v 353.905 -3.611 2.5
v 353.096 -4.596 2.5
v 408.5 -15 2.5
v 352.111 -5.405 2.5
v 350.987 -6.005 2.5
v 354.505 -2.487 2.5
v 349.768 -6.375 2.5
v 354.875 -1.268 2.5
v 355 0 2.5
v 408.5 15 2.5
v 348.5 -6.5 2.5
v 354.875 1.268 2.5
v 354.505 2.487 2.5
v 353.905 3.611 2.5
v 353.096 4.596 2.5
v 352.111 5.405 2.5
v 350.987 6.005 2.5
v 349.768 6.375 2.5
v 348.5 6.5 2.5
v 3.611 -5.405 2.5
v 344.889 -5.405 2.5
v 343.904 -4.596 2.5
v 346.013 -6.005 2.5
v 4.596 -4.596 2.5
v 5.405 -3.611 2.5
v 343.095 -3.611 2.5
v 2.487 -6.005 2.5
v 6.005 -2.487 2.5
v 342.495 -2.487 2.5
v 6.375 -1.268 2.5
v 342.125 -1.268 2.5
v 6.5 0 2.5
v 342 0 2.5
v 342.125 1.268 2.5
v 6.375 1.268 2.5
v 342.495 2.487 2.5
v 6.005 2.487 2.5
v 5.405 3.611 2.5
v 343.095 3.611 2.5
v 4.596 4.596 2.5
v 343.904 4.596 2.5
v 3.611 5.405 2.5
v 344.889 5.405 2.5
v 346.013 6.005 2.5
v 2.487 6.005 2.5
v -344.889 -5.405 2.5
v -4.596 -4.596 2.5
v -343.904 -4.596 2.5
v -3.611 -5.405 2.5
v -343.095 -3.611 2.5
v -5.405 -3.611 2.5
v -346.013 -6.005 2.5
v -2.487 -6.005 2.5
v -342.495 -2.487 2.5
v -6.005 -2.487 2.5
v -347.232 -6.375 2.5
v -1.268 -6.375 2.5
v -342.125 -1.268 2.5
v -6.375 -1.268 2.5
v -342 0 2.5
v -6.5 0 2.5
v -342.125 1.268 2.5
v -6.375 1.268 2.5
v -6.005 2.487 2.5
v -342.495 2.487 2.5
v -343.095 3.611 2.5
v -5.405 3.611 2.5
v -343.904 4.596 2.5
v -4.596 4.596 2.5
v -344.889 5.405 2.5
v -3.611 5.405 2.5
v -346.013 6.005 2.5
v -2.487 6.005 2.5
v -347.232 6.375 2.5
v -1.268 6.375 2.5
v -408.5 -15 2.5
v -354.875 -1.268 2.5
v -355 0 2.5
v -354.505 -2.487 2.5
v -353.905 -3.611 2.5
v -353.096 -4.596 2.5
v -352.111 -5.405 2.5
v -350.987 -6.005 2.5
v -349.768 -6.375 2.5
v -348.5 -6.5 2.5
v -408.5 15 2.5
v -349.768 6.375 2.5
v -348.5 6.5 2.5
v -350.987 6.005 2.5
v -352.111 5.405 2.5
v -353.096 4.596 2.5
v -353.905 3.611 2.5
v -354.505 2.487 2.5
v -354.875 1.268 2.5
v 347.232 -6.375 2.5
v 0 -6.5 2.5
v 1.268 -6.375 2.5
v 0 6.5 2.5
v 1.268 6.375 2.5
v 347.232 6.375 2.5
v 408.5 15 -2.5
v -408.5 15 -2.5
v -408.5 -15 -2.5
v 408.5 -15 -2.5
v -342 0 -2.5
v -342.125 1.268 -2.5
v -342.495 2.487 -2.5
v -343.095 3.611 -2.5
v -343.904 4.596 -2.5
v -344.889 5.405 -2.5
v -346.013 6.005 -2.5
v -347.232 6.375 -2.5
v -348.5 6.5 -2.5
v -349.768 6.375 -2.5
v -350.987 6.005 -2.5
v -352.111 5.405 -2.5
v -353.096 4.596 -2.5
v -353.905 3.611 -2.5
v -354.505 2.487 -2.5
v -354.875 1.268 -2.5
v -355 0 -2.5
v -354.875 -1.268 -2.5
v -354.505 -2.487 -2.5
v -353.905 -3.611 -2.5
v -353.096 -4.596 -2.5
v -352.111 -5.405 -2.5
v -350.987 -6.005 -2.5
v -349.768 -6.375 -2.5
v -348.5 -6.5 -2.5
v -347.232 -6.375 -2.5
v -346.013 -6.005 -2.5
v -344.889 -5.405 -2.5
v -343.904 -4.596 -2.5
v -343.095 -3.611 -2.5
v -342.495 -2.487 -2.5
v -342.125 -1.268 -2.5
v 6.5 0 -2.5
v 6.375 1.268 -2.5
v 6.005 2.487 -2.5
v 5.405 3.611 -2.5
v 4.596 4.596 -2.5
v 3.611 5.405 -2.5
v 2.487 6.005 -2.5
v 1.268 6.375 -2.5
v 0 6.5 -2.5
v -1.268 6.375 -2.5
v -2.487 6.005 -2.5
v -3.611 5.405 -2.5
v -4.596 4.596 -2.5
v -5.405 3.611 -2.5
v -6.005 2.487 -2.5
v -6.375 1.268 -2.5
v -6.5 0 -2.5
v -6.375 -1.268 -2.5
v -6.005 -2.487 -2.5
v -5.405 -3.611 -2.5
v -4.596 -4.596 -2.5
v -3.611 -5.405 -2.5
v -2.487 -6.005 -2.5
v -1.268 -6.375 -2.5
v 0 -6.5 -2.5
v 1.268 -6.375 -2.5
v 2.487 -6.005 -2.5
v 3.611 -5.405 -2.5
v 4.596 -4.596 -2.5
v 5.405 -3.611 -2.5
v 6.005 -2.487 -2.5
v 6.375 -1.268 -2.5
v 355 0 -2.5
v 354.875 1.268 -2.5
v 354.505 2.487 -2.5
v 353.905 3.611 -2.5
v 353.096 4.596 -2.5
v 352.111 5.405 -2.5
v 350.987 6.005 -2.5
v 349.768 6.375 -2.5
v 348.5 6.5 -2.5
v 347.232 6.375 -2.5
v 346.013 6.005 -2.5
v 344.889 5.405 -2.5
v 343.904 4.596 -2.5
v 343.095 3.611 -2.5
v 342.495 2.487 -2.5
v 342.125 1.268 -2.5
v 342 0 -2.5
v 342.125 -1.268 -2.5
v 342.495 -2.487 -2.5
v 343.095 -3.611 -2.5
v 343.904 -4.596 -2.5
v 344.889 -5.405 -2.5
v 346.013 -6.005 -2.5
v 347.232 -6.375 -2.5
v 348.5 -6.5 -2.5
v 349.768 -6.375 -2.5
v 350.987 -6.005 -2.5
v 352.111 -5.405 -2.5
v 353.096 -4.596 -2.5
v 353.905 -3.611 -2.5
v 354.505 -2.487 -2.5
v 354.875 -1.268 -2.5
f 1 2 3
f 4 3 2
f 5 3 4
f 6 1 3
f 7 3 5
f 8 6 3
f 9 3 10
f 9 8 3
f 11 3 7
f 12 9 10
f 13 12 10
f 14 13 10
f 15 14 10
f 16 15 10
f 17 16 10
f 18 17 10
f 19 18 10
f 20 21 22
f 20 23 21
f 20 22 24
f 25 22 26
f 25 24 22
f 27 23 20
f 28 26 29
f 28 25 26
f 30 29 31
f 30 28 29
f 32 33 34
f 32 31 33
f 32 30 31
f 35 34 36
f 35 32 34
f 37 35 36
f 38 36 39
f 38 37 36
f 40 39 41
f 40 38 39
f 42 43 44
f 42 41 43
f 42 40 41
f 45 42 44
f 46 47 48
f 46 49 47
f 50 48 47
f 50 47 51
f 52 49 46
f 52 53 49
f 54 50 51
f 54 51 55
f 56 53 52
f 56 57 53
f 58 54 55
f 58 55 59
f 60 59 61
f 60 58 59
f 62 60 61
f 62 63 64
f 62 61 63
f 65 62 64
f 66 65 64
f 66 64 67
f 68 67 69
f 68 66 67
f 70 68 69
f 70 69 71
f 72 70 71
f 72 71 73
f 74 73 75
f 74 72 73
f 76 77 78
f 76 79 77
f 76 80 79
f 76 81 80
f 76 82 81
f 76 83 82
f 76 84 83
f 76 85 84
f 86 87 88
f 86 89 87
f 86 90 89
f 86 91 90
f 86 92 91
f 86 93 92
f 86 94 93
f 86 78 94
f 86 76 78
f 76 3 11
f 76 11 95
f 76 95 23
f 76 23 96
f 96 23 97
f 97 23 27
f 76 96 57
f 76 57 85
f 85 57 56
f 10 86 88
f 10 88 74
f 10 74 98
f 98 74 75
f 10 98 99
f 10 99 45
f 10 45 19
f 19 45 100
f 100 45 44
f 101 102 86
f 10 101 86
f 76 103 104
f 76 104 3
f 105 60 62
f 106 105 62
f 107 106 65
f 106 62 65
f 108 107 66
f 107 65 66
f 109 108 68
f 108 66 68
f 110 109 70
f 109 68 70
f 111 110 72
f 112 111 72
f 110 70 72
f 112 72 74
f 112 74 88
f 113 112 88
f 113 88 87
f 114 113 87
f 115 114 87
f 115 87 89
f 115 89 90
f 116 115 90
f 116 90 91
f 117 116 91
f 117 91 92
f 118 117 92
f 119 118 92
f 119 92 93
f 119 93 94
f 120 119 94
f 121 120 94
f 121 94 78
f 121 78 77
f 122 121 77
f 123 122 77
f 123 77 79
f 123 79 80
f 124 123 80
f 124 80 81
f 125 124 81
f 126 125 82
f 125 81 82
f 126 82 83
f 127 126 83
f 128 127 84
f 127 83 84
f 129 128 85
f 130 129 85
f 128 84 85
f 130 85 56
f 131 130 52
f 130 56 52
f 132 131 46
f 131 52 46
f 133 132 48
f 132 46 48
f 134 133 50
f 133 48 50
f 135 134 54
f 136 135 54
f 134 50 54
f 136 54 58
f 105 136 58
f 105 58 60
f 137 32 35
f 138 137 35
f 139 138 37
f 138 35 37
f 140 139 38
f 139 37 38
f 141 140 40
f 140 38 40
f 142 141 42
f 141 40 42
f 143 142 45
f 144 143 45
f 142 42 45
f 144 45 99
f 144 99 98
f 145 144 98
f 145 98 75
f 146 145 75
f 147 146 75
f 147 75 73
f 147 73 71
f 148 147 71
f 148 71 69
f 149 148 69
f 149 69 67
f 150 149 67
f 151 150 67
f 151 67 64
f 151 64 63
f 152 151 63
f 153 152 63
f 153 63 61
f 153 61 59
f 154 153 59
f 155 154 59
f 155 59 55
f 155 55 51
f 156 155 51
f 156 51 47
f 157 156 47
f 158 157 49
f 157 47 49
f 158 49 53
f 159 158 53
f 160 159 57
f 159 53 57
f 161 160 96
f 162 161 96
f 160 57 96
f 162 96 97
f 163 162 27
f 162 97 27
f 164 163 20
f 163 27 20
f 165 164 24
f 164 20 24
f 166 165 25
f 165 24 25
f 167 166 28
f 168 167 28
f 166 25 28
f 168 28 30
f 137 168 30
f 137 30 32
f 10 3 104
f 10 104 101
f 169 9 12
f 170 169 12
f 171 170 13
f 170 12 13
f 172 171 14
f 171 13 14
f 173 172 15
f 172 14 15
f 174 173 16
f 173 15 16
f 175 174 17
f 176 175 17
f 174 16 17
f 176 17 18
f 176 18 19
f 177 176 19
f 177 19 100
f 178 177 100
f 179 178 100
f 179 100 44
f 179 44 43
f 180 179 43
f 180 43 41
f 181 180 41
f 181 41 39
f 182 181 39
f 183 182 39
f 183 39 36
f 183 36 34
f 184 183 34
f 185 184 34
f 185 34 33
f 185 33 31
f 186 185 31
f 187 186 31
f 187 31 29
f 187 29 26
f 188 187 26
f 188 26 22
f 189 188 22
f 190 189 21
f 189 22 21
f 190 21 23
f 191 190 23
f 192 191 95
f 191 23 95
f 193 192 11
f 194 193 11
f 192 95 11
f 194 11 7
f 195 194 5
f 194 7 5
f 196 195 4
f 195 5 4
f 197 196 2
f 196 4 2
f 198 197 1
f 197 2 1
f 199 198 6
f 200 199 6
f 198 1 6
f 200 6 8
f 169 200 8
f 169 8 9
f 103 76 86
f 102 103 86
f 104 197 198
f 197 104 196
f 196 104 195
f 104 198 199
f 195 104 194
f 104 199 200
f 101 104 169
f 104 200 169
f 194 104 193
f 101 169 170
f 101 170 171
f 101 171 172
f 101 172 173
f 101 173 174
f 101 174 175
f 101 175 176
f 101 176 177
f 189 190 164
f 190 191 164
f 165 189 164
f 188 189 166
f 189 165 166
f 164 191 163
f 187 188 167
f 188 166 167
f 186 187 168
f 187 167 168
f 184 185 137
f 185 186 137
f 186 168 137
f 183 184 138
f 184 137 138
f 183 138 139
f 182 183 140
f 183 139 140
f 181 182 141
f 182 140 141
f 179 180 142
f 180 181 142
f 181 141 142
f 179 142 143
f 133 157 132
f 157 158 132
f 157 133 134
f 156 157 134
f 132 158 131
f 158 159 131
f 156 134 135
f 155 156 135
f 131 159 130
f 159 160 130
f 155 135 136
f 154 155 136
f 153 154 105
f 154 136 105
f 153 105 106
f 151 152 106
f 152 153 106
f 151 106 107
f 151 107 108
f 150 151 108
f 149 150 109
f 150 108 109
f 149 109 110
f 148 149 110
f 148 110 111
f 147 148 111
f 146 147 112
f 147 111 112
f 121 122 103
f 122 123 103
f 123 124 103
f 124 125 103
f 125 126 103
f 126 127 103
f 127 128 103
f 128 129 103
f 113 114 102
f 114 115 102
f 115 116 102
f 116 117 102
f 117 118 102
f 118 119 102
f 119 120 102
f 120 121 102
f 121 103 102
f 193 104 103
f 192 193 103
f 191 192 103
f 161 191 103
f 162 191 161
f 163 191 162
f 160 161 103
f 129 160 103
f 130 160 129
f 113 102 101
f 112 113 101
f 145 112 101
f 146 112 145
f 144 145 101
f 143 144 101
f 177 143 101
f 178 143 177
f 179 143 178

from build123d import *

# Parameters (mm, degrees)
PLAT_W                          = 30
PLAT_H                          = 5
EL_MENT_M_CANO_SOUD_1_DEPTH     = 817
DIAM_TRE_DU_PER_AGE_13_0_13_1_D = 13
R_P_TITION_LIN_AIRE2_COUNT      = 3
R_P_TITION_LIN_AIRE2_PITCH      = 348.5


with BuildPart() as part:
    # plat → Elément mécano-soudé1 (new body)
    with BuildSketch(Plane.YZ.offset(-408.5)):
        Rectangle(PLAT_W, PLAT_H)
    extrude(amount=EL_MENT_M_CANO_SOUD_1_DEPTH)

    # Diamètre du perçage Ø13.0 (13)1 (through all)
    with Locations(Plane(origin=(0, 0, -2.5), x_dir=(-1, 0, 0), z_dir=(0, 0, -1))):
        with Locations((348.5, 0)):
            diam_tre_du_per_age_13_0_13_1 = Hole(DIAM_TRE_DU_PER_AGE_13_0_13_1_D / 2)

    # Répétition linéaire2: Diamètre du perçage Ø13.0 (13)1 ×3
    with Locations(*[(i * R_P_TITION_LIN_AIRE2_PITCH, 0, 0) for i in range(1, R_P_TITION_LIN_AIRE2_COUNT)]):
        add(diam_tre_du_per_age_13_0_13_1, mode=Mode.SUBTRACT)


solid = part.part
